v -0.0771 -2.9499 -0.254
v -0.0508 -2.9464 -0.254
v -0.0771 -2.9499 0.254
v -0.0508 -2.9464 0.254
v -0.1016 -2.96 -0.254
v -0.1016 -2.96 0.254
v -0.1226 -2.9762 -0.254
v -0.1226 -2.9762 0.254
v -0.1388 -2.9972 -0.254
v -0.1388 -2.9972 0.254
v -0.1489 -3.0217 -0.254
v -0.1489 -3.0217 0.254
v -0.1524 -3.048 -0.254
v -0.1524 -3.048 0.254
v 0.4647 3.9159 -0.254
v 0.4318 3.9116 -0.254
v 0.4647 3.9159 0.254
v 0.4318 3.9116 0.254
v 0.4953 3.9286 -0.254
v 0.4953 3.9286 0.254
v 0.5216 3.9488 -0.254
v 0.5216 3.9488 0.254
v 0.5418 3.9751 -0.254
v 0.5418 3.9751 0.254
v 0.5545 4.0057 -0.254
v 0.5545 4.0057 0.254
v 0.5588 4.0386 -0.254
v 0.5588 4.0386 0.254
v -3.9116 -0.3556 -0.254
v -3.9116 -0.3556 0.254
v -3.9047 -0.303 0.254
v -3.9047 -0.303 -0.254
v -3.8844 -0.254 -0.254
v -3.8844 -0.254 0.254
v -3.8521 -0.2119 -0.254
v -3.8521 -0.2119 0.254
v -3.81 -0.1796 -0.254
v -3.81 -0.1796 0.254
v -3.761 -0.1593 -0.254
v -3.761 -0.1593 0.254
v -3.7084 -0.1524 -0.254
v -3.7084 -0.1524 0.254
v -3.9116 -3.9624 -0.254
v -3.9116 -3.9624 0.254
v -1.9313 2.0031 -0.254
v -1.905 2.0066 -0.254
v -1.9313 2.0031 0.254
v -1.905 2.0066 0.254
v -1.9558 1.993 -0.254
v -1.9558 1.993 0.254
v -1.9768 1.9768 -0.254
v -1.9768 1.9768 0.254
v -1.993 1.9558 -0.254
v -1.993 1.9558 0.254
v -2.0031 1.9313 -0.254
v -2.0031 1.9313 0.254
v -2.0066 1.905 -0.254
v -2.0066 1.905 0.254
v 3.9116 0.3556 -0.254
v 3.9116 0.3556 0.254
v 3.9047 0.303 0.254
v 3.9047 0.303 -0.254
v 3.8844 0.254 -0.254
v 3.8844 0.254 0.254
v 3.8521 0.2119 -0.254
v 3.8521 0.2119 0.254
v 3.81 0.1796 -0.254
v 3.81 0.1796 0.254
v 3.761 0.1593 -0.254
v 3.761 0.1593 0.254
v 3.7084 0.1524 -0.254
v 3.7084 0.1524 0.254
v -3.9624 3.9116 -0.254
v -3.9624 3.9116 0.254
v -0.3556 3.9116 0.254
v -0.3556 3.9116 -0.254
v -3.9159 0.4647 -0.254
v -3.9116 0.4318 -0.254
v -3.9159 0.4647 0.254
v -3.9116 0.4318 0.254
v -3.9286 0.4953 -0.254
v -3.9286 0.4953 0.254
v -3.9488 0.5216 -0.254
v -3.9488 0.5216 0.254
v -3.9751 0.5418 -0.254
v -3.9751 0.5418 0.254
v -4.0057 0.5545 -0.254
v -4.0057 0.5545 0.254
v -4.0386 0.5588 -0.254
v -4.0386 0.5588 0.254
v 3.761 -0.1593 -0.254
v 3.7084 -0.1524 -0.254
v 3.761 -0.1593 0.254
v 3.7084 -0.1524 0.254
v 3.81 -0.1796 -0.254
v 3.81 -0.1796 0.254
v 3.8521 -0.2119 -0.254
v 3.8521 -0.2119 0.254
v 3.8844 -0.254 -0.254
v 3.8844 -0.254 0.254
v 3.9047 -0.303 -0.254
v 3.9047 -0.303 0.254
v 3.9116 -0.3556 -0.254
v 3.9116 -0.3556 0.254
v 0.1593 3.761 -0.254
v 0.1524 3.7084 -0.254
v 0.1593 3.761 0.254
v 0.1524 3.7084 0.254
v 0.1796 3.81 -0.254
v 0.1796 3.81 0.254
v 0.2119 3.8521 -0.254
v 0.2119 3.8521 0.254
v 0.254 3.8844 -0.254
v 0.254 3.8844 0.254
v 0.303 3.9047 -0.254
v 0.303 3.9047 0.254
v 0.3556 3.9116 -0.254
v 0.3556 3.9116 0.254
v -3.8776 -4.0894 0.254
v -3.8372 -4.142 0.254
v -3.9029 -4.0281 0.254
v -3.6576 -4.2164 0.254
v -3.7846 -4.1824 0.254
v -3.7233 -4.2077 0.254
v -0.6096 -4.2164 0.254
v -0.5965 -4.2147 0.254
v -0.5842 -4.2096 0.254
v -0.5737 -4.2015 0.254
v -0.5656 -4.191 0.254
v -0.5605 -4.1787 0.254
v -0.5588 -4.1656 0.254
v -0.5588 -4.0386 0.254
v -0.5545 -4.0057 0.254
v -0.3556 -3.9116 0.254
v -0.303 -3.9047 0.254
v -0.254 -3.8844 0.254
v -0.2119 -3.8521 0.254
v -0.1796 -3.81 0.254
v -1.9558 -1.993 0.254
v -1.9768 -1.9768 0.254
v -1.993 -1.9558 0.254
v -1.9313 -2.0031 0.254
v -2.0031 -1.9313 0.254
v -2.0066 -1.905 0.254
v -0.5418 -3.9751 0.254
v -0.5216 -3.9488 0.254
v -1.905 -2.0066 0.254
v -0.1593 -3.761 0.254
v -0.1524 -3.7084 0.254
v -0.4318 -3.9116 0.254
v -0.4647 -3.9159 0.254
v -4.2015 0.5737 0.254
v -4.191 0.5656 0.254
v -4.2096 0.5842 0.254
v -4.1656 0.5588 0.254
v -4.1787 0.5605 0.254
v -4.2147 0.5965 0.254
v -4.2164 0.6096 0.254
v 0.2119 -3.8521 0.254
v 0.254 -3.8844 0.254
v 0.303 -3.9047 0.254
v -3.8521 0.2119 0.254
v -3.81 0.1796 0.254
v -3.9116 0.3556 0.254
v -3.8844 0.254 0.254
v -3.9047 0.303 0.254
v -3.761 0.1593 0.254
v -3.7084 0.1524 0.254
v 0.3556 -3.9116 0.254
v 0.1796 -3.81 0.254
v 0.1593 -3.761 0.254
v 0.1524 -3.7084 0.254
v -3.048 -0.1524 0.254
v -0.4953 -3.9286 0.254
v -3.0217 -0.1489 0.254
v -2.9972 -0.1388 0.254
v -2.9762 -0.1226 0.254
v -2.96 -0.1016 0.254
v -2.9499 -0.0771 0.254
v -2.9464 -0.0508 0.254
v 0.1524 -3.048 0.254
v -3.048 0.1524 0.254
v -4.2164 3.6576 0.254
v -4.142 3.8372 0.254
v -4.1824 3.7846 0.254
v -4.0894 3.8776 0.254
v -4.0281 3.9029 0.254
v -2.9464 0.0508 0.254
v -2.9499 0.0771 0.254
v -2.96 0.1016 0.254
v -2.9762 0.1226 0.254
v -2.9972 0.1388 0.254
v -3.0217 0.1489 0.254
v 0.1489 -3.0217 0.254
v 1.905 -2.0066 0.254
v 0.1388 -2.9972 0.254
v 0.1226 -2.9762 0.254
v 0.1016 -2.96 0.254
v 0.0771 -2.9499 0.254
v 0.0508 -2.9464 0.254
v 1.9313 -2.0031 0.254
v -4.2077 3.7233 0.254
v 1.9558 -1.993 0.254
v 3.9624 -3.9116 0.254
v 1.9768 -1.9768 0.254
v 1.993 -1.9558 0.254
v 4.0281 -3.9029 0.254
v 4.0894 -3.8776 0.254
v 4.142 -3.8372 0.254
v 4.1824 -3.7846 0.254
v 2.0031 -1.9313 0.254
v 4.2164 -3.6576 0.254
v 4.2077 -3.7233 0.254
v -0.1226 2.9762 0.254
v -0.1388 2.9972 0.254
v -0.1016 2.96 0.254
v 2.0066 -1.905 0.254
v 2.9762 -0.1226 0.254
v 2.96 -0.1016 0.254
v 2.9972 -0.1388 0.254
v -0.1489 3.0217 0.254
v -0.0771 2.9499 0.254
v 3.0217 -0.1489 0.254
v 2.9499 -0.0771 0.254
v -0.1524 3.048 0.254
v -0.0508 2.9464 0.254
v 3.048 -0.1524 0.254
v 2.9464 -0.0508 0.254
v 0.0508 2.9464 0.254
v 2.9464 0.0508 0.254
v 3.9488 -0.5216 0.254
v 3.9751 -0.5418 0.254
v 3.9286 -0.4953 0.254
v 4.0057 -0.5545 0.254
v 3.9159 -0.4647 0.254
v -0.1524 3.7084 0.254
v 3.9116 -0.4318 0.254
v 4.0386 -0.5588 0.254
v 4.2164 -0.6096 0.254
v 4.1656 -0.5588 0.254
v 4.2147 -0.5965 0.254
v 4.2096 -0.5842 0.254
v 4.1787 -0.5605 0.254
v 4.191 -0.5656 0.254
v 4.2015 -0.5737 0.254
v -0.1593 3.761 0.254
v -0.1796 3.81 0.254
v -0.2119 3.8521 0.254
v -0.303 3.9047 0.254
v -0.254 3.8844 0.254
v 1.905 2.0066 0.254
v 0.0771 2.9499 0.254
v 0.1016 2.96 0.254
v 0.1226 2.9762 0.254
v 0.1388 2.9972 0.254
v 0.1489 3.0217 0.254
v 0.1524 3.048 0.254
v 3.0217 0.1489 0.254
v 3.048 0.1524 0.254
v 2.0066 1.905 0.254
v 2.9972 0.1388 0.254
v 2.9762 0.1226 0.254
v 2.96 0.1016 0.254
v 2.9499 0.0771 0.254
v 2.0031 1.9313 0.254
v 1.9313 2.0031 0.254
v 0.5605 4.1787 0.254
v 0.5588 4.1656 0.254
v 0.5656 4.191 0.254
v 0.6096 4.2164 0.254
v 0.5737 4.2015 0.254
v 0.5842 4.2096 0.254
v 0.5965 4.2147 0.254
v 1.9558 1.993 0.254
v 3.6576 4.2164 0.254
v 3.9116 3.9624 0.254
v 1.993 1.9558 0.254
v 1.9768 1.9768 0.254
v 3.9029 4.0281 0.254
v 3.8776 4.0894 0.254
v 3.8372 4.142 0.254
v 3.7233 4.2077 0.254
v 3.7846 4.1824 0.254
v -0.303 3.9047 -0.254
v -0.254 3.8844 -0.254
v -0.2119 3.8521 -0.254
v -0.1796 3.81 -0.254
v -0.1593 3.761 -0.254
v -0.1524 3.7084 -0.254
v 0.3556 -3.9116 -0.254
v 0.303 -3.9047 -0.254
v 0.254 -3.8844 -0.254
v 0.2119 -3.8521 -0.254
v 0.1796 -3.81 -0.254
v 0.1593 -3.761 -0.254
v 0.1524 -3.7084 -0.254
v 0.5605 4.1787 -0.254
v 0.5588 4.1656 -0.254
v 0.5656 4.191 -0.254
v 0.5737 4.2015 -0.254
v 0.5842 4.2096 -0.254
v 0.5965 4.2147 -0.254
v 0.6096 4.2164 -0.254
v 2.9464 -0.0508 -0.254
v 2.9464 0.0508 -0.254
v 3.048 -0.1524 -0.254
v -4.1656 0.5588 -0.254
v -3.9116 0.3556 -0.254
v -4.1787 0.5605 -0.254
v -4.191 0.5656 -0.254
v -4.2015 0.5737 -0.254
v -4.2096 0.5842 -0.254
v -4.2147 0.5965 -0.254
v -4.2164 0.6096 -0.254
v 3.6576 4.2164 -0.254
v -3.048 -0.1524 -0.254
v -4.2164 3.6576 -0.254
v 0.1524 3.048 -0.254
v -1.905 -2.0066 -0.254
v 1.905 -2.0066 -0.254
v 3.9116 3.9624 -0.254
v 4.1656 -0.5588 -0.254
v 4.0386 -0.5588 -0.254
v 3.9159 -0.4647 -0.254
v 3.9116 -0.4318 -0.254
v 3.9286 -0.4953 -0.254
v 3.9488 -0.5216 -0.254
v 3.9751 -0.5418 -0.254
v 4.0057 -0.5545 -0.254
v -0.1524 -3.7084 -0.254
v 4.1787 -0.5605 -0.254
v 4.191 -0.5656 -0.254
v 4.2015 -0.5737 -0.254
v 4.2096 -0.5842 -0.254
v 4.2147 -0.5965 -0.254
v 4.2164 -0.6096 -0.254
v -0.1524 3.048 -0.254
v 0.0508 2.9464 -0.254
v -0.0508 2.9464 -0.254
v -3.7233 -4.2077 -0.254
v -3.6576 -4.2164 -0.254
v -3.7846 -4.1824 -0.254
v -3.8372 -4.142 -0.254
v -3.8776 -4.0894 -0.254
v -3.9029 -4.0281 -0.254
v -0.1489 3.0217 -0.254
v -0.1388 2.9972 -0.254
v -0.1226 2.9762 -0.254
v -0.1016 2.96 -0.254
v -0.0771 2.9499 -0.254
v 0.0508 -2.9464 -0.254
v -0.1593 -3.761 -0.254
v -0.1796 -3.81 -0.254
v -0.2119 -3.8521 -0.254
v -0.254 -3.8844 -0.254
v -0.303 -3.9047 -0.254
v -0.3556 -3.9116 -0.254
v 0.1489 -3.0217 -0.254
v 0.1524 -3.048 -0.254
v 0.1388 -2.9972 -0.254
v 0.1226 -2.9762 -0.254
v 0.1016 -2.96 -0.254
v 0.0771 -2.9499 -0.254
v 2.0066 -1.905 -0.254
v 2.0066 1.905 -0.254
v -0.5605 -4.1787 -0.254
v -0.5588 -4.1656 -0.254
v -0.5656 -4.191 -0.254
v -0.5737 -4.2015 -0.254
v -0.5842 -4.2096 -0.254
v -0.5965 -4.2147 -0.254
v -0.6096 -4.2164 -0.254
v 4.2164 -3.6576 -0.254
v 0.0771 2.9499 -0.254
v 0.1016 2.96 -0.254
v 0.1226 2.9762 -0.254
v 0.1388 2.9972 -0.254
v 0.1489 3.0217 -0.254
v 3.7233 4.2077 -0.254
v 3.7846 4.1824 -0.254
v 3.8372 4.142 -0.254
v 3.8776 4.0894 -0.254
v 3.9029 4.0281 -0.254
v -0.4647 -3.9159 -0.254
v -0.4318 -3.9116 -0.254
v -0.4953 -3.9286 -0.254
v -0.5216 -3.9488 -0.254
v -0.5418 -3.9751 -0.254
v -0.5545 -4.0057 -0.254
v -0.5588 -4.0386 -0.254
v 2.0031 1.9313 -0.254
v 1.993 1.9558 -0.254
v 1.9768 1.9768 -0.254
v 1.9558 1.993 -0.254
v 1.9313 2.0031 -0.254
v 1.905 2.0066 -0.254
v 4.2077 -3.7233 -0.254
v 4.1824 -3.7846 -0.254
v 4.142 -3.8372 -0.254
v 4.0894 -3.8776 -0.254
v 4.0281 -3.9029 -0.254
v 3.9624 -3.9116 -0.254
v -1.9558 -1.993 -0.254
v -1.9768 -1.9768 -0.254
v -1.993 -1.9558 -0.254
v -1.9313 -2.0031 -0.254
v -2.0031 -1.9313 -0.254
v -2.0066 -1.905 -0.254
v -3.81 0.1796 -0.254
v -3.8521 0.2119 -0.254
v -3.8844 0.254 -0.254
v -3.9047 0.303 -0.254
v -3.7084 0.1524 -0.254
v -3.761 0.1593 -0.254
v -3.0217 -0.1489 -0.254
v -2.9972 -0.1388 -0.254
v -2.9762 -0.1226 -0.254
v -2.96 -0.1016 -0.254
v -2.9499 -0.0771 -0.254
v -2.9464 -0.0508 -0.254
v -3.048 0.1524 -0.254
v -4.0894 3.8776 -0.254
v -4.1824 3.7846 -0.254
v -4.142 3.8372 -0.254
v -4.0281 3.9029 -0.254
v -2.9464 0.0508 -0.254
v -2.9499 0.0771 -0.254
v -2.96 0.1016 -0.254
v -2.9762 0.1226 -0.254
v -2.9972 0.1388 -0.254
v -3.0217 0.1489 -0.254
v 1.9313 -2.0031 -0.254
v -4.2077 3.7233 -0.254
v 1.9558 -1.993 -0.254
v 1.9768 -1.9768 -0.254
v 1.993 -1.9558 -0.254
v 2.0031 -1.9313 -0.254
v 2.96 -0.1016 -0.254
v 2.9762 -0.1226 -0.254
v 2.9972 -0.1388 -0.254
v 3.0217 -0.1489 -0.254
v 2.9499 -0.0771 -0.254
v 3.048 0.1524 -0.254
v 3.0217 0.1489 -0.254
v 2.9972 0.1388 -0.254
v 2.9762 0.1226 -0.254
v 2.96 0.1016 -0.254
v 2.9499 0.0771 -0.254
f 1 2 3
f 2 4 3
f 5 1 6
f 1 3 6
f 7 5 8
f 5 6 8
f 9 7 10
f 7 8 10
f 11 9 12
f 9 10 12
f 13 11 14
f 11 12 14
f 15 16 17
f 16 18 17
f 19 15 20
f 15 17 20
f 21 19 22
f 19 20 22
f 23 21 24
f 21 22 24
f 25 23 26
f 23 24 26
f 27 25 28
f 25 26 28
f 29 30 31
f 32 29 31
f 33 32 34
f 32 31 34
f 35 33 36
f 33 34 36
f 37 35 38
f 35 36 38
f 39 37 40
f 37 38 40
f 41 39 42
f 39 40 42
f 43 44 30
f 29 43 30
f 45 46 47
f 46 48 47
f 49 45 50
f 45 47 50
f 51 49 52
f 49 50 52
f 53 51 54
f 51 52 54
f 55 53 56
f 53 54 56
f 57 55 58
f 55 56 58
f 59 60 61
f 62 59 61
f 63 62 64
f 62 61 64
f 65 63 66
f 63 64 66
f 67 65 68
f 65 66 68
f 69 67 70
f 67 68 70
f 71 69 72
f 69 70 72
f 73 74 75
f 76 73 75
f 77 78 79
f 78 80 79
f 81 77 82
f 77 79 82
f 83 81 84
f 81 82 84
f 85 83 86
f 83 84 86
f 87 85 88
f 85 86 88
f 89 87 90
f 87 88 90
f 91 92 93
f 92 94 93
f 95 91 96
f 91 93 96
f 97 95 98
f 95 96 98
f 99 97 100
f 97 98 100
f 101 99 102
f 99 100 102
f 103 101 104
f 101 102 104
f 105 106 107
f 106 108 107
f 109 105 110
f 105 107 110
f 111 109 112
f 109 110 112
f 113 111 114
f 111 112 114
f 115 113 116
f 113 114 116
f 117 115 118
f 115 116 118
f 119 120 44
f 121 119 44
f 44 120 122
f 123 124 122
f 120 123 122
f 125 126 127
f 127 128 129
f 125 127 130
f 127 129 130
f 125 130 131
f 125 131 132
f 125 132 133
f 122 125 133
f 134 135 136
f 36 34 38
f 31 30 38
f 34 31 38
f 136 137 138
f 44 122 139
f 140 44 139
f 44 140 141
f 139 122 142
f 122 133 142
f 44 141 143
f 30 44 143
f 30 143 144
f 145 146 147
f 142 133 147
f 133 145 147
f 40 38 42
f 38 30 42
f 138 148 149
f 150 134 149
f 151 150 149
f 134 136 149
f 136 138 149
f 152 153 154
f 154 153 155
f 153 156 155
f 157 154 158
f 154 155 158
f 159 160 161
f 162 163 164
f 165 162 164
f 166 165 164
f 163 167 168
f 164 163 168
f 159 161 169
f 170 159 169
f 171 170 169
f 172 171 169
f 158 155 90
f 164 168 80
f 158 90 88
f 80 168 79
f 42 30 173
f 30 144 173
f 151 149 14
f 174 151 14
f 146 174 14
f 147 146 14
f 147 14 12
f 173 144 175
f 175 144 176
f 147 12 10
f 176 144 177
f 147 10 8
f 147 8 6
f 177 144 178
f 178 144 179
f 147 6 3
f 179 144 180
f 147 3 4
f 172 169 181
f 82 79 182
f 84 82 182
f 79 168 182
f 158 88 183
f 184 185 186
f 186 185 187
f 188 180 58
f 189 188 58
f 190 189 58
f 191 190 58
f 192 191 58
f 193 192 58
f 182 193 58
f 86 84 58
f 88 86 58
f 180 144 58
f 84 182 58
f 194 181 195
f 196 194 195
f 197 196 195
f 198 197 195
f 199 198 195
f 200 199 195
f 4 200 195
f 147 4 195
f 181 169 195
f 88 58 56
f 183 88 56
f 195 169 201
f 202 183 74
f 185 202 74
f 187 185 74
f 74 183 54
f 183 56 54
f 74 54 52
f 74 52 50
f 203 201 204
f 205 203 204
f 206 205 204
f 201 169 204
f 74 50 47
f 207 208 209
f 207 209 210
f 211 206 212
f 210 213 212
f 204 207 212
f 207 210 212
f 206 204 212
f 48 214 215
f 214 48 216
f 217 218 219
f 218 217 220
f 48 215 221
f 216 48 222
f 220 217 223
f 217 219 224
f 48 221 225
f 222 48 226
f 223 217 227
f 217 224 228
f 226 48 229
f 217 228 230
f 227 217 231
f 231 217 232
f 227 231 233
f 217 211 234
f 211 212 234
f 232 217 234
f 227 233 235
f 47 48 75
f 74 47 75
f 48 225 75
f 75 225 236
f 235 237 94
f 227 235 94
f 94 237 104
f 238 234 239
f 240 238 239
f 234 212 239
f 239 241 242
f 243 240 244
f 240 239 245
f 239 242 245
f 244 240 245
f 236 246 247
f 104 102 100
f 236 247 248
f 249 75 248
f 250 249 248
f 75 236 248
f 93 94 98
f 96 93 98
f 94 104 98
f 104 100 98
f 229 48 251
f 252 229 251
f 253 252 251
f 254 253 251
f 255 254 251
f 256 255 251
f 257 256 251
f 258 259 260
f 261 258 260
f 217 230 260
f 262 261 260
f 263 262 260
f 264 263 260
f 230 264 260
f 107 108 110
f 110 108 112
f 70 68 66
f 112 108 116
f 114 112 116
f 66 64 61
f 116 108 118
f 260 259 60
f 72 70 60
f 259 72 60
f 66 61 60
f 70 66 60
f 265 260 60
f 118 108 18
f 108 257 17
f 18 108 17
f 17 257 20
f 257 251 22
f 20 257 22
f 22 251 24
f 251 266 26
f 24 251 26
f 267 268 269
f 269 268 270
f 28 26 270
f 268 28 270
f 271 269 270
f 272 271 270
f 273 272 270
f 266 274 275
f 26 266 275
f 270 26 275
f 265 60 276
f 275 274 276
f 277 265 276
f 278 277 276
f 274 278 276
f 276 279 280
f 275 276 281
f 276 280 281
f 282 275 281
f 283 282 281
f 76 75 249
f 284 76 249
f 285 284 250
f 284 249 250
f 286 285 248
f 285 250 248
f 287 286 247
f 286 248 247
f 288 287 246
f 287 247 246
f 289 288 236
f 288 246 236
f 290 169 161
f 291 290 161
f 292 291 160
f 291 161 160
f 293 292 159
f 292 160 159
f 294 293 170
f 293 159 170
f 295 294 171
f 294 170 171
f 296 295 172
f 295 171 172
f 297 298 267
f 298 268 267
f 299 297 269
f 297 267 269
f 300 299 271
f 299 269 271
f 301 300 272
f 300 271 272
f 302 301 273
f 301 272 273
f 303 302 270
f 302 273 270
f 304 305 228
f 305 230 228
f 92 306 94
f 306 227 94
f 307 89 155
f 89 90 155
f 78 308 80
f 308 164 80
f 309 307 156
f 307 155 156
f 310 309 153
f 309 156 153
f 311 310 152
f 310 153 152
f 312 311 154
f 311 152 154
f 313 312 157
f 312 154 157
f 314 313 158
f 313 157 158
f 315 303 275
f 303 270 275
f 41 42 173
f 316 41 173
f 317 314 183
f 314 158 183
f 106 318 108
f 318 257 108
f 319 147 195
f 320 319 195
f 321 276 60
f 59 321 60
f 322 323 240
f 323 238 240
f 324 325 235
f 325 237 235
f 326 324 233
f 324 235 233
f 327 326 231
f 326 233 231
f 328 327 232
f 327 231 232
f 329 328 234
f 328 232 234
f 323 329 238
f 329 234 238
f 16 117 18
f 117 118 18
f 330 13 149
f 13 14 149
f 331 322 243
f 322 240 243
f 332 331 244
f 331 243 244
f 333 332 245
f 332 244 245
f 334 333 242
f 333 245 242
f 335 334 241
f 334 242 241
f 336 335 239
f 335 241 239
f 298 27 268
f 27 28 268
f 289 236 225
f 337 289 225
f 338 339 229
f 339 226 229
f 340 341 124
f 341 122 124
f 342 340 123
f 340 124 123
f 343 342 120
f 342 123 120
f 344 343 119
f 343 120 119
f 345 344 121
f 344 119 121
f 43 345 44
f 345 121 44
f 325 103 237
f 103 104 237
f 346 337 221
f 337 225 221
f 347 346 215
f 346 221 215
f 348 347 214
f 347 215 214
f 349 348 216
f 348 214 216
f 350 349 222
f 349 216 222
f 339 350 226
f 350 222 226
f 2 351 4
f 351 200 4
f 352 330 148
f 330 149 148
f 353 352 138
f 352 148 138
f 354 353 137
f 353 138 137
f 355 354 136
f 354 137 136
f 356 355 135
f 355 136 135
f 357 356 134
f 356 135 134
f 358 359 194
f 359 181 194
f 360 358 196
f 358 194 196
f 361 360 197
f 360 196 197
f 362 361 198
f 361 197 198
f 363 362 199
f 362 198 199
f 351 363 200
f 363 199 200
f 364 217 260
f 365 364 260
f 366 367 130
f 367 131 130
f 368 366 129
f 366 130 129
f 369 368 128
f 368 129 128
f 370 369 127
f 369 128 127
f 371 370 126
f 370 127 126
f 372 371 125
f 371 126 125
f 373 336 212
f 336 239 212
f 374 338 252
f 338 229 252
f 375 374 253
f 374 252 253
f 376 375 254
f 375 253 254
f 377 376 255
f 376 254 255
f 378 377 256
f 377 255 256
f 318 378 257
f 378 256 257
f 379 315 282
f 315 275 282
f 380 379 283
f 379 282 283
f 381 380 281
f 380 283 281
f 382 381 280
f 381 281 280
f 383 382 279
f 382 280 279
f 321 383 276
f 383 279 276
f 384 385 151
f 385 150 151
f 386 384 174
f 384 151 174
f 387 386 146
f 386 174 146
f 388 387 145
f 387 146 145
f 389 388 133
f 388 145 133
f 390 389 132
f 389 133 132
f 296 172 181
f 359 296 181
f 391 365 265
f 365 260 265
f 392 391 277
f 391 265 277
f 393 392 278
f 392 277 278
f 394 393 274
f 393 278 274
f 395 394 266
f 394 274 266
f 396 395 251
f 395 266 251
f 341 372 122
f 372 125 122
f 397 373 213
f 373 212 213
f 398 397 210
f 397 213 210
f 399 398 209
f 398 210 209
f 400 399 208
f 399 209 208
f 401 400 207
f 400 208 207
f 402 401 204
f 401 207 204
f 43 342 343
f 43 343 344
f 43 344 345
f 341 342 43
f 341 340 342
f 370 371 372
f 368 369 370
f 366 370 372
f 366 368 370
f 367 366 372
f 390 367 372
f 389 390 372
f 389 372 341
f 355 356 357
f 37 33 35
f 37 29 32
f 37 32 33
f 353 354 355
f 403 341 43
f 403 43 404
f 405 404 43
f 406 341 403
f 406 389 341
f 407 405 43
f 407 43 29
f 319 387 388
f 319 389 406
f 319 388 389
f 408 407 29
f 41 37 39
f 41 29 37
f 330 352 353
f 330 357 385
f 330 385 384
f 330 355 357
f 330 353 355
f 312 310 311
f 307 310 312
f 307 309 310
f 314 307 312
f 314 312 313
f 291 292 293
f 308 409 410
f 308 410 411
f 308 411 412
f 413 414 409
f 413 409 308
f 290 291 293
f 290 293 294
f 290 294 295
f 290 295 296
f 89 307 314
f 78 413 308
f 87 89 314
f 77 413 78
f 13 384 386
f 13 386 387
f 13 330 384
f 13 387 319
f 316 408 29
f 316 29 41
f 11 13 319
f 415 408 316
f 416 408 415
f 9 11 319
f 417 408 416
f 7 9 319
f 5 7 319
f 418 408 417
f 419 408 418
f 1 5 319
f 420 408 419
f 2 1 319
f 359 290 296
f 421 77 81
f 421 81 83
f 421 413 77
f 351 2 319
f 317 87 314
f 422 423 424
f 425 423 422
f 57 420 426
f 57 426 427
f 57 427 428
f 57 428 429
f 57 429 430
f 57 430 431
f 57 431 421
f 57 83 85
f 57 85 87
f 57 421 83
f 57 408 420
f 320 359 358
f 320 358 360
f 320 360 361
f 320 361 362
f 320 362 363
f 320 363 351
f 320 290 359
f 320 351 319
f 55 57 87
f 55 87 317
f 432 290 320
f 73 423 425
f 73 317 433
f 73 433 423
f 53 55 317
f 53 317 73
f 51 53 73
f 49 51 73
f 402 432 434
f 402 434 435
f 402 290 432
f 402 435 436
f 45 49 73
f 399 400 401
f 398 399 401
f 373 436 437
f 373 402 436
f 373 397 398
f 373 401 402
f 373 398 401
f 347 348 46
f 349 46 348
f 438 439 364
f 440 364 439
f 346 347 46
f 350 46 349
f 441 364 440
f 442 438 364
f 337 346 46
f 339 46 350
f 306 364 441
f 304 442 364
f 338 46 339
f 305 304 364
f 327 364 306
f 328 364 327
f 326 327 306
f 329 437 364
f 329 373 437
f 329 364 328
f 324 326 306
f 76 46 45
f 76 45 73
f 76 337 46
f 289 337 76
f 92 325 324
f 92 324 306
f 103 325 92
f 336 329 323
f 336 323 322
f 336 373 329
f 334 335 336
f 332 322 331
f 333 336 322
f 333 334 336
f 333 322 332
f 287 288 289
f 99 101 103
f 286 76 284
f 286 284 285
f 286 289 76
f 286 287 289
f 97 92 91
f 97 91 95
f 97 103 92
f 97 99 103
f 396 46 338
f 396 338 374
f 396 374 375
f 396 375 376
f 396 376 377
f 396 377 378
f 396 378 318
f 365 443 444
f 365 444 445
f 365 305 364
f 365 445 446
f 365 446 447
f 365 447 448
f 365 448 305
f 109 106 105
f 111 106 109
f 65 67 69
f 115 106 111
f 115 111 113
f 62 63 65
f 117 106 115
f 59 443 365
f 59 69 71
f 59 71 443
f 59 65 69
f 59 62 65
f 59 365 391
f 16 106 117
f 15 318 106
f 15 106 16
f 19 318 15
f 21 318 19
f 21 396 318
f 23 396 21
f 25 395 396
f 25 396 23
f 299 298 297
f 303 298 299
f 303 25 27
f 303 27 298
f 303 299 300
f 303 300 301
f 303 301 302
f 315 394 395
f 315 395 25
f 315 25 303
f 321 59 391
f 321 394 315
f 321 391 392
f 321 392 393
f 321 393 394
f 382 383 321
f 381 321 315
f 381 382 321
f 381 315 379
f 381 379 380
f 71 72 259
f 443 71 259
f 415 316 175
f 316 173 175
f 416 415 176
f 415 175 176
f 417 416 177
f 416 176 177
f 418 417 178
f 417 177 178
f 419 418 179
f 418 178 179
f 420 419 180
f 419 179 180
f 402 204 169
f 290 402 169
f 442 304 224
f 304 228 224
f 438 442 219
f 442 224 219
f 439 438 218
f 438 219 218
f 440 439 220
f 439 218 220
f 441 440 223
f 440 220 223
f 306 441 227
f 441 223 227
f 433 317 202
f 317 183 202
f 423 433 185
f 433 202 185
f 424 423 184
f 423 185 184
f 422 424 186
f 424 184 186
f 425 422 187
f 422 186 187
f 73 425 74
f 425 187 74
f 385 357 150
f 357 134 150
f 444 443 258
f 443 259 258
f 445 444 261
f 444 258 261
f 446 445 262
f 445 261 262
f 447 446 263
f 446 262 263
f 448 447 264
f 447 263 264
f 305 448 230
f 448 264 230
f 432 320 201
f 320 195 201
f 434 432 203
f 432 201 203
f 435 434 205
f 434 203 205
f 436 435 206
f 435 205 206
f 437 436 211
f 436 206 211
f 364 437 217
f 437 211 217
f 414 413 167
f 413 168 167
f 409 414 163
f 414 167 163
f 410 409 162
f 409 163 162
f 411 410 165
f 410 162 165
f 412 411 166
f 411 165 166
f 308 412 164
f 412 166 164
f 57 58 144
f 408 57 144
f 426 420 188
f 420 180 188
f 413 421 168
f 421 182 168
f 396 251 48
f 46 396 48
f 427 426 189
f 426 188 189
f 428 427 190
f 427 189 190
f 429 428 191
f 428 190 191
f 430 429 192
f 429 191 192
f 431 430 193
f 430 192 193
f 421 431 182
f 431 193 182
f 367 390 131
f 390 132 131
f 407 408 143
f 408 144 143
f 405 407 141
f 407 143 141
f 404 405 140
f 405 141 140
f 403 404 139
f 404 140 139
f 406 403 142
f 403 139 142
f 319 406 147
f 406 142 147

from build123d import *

# Parameters (mm, degrees)
EXTRUDE1_DEPTH    = 0.254
CIRPATTERN1_COUNT = 4


with BuildPart() as part:
    # Sketch2 → Extrude1 (new, symmetric)
    with BuildSketch(Plane.XY):
        with BuildLine():
            Line((-0.1524, 3.7084), (-0.1524, 3.048))
            ThreePointArc((-0.1524, 3.048), (-0.122642049, 2.976157951), (-0.0508, 2.9464))
            Line((-0.0508, 2.9464), (0.0508, 2.9464))
            ThreePointArc((0.0508, 2.9464), (0.122642049, 2.976157951), (0.1524, 3.048))
            Line((0.1524, 3.048), (0.1524, 3.7084))
            ThreePointArc((0.1524, 3.7084), (0.211915902, 3.852084098), (0.3556, 3.9116))
            Line((0.3556, 3.9116), (0.4318, 3.9116))
            ThreePointArc((0.4318, 3.9116), (0.521602561, 3.948797439), (0.5588, 4.0386))
            Line((0.5588, 4.0386), (0.5588, 4.1656))
            ThreePointArc((0.5588, 4.1656), (0.573678976, 4.201521024), (0.6096, 4.2164))
            Line((0.6096, 4.2164), (3.6576, 4.2164))
            ThreePointArc((3.6576, 4.2164), (3.837205122, 4.142005122), (3.9116, 3.9624))
            Line((3.9116, 3.9624), (3.9116, 0.762))
            Line((3.9116, 0.762), (2.0066, 0.762))
            Line((2.0066, 0.762), (2.0066, 1.905))
            ThreePointArc((2.0066, 1.905), (1.976842049, 1.976842049), (1.905, 2.0066))
            Line((1.905, 2.0066), (-0.889, 2.0066))
            Line((-0.889, 2.0066), (-0.889, 3.9116))
            Line((-0.889, 3.9116), (-0.3556, 3.9116))
            ThreePointArc((-0.3556, 3.9116), (-0.211915902, 3.852084098), (-0.1524, 3.7084))
        make_face()
    extrude1 = extrude(amount=EXTRUDE1_DEPTH, both=True)

    # CirPattern1: Extrude1 ×4 about axis
    cirpattern1_axis = Axis((0, 0, -69.733664692), (0, 0, 1))
    for i in range(1, CIRPATTERN1_COUNT):
        add(extrude1.rotate(cirpattern1_axis, i * 360 / CIRPATTERN1_COUNT))


solid = part.part
